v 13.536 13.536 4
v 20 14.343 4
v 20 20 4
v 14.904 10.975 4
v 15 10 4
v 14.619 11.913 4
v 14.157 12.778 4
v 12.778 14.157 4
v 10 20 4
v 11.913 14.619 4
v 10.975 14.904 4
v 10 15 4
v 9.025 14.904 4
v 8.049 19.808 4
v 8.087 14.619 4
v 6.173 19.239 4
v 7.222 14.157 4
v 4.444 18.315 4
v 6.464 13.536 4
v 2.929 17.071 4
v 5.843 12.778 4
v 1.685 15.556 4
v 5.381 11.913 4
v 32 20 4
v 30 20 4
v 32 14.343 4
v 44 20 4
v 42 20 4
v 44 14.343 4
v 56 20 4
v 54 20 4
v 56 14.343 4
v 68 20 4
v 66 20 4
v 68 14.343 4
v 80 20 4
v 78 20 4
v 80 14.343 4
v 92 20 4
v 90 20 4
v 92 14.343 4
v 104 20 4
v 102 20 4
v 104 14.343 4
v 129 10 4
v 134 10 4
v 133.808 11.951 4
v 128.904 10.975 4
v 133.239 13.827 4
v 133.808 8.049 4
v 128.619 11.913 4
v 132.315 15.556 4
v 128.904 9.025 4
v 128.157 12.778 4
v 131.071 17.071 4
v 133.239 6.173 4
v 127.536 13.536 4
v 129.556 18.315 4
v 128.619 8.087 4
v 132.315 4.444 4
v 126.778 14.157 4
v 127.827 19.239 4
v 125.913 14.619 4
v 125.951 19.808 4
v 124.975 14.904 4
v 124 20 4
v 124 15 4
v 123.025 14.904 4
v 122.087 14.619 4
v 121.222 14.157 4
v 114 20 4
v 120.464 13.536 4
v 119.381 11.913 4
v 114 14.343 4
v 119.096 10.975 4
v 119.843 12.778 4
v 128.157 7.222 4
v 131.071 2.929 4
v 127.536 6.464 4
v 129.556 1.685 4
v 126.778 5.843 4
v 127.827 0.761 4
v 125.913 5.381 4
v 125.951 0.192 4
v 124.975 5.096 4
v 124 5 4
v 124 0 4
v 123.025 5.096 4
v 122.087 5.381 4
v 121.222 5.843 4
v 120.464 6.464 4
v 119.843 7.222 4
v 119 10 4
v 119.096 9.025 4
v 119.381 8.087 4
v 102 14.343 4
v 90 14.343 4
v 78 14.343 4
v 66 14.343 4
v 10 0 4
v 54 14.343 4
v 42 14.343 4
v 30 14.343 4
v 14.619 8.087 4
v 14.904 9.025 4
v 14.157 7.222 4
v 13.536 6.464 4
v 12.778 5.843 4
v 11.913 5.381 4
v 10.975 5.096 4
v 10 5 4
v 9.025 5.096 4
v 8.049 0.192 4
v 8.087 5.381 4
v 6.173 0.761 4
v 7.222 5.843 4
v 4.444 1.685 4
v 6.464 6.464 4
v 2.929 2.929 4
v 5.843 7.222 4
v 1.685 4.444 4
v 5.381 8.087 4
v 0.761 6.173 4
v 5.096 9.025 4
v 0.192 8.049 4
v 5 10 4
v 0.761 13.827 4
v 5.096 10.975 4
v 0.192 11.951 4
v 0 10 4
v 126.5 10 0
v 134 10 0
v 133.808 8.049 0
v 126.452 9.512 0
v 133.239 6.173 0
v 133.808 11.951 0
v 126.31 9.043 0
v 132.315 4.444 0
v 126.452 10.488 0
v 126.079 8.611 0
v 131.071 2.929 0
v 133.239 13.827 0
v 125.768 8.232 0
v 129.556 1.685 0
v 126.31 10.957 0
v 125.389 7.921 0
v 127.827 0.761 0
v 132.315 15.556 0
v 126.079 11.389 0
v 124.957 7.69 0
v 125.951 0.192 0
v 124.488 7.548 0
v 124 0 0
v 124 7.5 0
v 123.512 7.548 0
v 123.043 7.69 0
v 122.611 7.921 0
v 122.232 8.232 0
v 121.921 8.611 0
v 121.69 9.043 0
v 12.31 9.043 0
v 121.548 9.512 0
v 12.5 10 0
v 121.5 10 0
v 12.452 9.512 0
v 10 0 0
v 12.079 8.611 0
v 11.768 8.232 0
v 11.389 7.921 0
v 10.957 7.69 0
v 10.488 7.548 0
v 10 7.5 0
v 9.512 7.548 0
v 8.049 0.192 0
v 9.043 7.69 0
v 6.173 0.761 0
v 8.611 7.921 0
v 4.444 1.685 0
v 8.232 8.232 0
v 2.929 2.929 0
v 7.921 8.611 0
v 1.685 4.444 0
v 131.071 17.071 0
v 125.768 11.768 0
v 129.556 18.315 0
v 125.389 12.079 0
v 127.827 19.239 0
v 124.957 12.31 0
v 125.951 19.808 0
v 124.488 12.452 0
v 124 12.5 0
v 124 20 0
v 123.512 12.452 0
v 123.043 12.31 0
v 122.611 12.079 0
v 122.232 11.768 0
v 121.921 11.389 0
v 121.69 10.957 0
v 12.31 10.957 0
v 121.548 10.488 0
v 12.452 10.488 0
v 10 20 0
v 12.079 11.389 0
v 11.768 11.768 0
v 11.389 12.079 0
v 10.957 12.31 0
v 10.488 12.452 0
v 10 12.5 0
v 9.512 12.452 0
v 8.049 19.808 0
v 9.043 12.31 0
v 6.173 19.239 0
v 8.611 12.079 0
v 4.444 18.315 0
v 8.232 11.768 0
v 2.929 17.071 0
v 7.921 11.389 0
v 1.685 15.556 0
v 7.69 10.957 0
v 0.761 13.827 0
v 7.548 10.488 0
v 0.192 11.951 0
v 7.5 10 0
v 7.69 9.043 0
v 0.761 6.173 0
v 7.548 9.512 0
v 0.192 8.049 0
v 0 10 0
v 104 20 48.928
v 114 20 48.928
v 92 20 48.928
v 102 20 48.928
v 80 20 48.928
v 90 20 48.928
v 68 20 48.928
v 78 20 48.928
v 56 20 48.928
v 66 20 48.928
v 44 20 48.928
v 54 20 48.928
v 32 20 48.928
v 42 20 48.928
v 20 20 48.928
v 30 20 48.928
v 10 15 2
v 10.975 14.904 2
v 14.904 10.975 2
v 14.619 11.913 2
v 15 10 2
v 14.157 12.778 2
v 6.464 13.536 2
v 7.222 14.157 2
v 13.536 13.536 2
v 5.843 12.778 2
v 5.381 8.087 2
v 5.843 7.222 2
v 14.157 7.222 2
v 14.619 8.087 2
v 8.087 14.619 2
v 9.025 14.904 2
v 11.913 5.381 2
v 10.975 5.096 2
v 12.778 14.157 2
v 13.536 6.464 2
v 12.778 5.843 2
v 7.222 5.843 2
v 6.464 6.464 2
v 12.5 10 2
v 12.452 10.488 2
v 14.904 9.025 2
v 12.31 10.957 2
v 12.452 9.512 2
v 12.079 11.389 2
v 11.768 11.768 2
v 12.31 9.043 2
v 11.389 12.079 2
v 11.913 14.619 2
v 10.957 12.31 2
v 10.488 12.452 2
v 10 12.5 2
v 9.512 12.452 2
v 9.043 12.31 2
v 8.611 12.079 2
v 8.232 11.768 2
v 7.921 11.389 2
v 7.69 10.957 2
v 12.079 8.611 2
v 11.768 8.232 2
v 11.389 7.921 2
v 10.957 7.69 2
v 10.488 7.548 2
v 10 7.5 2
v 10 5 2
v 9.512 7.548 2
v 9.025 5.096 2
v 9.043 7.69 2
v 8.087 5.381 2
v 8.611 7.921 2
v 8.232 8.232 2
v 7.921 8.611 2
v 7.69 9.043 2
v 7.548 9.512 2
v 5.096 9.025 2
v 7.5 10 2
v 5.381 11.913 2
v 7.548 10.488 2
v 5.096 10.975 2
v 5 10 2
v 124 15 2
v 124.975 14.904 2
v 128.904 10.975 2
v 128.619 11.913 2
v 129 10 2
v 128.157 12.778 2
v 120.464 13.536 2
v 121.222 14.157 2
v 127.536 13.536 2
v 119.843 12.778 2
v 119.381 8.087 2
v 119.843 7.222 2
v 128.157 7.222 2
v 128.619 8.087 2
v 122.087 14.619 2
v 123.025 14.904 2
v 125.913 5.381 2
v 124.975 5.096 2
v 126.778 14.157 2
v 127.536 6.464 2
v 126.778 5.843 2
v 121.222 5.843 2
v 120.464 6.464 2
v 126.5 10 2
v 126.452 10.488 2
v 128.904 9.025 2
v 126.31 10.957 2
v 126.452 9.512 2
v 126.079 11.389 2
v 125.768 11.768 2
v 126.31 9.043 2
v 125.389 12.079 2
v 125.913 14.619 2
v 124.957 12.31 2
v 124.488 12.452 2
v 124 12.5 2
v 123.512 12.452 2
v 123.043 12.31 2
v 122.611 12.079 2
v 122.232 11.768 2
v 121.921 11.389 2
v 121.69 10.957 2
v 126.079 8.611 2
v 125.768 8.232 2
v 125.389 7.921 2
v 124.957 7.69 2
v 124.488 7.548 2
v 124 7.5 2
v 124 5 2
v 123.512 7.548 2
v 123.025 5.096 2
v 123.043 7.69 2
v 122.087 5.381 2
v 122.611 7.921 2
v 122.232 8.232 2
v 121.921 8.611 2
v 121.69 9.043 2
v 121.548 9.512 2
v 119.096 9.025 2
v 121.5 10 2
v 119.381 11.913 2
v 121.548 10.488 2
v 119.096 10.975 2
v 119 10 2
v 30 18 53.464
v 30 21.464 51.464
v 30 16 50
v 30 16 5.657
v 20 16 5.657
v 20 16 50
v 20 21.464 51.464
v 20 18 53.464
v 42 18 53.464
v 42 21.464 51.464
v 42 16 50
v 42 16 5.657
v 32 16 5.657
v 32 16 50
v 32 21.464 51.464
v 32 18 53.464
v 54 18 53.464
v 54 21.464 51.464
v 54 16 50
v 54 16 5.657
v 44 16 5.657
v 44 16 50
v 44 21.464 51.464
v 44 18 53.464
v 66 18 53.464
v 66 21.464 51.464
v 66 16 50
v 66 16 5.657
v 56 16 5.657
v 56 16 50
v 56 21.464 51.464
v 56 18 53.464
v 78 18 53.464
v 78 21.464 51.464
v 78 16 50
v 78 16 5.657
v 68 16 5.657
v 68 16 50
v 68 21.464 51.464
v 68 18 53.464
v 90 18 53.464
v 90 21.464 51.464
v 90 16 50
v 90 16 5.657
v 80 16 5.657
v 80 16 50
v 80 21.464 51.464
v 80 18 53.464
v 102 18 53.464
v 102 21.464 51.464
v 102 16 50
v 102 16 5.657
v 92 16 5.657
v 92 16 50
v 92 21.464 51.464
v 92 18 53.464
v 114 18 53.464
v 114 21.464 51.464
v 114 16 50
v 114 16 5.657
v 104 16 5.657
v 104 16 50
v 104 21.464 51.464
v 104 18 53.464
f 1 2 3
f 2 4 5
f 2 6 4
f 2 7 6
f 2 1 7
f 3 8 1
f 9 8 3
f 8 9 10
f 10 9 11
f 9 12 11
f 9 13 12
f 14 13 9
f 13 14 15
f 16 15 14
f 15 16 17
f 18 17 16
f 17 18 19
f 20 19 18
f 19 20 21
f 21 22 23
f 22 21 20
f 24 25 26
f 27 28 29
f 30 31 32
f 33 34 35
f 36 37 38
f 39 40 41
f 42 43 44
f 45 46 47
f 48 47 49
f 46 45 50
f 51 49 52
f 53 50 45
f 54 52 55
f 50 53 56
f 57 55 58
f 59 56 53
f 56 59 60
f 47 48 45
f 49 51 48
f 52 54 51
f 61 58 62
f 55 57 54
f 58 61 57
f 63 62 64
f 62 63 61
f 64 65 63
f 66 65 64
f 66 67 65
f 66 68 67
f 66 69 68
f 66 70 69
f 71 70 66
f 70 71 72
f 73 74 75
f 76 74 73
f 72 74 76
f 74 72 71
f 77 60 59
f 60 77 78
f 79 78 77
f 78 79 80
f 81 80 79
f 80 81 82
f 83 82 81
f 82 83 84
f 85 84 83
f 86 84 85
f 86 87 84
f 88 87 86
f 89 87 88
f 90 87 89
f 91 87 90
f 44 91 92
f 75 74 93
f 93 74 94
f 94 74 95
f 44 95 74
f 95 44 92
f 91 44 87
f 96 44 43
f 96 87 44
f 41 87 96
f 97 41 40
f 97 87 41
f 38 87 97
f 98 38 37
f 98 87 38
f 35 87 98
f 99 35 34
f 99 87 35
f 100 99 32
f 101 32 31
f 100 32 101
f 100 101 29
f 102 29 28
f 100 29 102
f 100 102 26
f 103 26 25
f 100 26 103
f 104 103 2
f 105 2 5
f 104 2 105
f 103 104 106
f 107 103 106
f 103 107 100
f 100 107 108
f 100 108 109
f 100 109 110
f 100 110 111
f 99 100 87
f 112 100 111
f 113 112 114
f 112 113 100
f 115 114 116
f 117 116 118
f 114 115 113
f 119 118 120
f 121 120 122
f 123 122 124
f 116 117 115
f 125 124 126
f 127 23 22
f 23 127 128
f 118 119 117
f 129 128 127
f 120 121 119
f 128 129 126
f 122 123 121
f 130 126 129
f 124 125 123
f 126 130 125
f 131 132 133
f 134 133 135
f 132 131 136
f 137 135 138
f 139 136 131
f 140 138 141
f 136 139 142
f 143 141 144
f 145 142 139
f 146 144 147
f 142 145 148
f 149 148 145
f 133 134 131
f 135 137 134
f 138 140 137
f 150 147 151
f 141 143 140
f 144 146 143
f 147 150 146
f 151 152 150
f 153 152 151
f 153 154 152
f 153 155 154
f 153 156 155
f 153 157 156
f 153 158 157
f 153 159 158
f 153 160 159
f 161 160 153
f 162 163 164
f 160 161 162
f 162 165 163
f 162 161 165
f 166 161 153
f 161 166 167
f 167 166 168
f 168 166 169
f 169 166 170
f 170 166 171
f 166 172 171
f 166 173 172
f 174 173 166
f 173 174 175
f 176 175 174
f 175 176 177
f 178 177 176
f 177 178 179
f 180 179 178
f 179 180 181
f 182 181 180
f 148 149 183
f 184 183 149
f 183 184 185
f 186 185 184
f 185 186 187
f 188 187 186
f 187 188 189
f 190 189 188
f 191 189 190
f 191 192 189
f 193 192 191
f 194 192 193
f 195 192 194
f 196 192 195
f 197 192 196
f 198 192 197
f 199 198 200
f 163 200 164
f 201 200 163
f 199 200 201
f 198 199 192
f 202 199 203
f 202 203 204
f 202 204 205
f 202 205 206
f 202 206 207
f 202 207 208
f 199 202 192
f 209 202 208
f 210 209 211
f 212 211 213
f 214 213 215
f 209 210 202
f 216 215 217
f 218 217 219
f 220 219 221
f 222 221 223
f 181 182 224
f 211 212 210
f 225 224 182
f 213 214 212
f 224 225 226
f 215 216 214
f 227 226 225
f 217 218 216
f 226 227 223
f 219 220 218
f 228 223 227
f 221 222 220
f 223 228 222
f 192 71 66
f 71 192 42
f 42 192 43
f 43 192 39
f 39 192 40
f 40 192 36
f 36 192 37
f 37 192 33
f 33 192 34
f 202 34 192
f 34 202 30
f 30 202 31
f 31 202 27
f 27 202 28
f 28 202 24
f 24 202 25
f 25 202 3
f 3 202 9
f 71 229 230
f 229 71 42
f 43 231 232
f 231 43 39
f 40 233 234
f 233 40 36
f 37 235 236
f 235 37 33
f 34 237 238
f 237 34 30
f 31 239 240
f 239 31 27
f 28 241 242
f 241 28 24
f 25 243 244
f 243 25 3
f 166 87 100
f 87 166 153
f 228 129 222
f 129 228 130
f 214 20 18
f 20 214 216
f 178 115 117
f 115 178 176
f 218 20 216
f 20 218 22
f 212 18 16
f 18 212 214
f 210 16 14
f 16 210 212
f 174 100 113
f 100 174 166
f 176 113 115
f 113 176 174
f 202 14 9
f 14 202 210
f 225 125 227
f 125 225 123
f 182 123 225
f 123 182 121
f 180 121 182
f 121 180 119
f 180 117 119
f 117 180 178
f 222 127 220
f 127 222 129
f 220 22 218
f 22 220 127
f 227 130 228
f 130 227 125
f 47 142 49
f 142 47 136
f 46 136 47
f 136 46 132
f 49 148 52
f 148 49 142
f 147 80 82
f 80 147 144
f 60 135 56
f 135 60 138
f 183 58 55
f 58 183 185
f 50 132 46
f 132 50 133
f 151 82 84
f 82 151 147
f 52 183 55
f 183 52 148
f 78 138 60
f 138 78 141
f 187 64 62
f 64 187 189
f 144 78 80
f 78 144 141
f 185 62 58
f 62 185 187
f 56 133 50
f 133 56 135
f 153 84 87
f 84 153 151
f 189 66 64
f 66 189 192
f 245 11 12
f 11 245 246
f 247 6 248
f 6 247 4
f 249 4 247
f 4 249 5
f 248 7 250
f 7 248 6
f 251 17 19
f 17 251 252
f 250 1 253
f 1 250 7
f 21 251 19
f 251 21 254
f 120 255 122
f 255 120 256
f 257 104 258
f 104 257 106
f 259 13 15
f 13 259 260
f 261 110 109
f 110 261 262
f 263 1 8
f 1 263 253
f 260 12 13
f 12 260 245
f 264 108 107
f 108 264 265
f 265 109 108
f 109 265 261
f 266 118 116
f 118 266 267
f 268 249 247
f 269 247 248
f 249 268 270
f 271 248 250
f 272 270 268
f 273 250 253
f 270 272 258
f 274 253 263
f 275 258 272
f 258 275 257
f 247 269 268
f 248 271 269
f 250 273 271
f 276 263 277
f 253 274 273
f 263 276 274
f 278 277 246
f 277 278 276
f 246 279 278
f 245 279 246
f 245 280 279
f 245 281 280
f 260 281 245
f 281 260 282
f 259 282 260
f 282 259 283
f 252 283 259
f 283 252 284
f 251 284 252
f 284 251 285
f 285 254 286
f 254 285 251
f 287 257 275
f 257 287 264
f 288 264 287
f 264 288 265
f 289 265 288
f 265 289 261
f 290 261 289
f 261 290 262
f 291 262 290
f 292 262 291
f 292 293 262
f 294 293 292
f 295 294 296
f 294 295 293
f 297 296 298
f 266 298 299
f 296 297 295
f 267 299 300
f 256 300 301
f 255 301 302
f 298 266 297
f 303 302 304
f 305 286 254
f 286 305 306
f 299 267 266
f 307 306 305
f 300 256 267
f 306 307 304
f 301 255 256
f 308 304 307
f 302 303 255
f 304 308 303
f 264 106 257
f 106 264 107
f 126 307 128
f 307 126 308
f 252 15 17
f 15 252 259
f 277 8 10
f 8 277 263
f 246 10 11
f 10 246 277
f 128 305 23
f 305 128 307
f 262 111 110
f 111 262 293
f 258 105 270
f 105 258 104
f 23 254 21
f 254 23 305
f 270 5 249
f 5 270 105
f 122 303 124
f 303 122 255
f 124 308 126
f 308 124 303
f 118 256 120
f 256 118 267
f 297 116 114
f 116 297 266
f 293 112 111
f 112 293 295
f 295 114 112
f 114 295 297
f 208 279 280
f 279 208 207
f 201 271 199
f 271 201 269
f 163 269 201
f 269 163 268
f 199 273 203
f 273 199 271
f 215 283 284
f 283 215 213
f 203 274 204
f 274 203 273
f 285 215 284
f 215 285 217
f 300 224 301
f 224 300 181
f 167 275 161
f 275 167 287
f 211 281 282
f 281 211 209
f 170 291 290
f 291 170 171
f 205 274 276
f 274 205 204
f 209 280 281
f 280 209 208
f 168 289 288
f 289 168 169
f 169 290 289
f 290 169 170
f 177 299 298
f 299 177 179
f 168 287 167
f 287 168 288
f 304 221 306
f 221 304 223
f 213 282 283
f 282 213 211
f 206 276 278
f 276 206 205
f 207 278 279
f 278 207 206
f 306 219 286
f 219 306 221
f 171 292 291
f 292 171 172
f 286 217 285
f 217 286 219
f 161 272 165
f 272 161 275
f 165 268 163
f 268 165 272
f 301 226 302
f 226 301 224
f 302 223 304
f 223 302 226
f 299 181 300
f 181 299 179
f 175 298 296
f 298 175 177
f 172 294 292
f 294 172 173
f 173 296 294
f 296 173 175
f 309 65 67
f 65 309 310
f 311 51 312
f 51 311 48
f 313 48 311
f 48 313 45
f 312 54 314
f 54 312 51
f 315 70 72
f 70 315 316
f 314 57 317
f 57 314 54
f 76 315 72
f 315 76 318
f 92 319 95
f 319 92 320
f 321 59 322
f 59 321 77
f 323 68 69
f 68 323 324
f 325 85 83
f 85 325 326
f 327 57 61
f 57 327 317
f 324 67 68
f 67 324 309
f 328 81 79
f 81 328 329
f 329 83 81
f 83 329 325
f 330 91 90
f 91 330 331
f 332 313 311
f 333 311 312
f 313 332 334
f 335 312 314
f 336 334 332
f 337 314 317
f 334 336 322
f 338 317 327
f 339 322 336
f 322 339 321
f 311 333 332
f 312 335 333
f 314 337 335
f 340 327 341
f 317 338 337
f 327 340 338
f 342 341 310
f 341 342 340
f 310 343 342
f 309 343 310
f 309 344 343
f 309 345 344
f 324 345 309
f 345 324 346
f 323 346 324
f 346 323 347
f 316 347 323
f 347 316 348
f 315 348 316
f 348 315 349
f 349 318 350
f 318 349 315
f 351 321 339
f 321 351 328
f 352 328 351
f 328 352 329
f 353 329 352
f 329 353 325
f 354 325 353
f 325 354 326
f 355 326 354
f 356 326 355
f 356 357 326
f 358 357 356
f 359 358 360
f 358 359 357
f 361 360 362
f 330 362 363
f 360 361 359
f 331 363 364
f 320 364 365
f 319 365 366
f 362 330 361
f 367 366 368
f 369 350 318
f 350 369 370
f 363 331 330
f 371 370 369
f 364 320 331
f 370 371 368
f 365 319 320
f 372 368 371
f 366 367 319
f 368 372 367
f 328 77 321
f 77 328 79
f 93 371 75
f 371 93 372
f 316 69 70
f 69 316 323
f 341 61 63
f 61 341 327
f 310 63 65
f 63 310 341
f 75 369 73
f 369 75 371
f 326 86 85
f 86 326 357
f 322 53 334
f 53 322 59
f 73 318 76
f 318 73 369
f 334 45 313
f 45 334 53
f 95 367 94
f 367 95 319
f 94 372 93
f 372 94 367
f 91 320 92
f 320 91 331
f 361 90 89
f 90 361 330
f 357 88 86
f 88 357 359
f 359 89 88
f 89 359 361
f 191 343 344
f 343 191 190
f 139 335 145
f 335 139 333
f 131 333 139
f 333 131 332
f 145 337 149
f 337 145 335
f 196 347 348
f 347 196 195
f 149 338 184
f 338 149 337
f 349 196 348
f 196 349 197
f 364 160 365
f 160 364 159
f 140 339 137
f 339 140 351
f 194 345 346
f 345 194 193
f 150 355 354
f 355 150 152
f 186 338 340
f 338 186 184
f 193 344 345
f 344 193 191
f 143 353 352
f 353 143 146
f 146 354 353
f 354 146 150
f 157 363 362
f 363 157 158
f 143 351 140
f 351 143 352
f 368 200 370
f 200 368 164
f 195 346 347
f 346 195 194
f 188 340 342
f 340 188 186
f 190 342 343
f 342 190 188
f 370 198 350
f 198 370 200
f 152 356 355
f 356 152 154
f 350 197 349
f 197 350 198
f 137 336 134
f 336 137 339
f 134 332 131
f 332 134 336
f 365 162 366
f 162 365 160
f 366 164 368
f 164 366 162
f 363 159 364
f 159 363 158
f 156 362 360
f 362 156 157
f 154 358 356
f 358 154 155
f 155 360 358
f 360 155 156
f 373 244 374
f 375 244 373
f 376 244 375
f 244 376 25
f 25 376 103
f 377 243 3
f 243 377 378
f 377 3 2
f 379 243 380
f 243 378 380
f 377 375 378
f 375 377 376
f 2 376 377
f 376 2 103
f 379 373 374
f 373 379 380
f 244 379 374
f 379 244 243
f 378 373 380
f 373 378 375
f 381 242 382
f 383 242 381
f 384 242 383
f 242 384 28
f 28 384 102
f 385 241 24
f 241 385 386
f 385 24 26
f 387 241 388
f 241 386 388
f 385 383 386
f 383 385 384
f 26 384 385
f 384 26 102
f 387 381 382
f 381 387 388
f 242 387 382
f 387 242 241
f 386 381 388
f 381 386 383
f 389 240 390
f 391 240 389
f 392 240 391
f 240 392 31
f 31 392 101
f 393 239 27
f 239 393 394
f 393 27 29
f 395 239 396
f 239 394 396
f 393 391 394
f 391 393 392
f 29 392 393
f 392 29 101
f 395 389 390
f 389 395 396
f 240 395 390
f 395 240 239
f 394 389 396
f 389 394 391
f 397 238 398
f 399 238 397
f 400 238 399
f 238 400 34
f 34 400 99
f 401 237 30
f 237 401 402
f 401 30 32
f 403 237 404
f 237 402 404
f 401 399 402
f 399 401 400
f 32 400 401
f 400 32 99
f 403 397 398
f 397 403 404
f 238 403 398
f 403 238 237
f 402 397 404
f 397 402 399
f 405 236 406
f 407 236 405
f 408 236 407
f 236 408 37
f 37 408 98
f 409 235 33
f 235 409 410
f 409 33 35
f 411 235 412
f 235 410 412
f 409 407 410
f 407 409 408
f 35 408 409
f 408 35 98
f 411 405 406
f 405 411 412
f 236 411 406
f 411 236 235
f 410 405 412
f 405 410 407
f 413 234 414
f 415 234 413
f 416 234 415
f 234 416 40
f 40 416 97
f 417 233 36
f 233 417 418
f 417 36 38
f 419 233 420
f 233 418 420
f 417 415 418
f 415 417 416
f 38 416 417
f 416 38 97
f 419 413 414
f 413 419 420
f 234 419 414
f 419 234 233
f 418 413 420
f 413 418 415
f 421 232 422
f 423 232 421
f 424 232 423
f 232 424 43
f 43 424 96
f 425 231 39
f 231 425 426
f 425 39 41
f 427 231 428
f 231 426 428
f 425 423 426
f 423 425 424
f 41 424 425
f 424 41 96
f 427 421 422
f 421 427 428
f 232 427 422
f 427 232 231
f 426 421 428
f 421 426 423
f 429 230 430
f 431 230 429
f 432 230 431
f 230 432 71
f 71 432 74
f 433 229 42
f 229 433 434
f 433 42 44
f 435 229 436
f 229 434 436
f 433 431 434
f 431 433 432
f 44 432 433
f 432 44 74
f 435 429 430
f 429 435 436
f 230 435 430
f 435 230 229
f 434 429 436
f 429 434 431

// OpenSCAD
// [FL_INDEX: keywords="openscad, 3d_parametric, Jumper_Wire_Rack, csg_solid" | COT="Parametric OpenSCAD design from 3DCodeverse"]
// Title: Jumper Wire Rack

// This script creates a wire rack with a variable number of tines

$fn = 32+1-1;	// Dummy math to avoid showing in customizer.

// Number of tines
N = 8;			// [2:20]
tine_width = 10;
tine_height = 4+1-1;
tine_length = 50;
tine_pitch = 12;

base_height = 20;
base_width = base_height*2 + (N-1)*(tine_pitch) + tine_width;
base_thickness = 4+1-1;

echo("<b>Base width [mm]:", base_width);

countersink_diameter = 10;
hole_diameter = 5;

difference()
{
	// Baseplate
	union()
	{
		translate([base_height/2,0,0]) cube([base_width-base_height,base_height,base_thickness]);
		translate([base_height/2,base_height/2,0]) cylinder(base_thickness,base_height/2,base_height/2);
		translate([base_width-base_height/2,base_height/2,0]) cylinder(base_thickness,base_height/2,base_height/2);		
	}

	// Screw holes
	for (i = [0:1])
	{
		translate([base_height/2+(base_width-base_height)*i,base_height/2,4])
		{
			union()
			{
				// Countersink
				cylinder(base_thickness,countersink_diameter/2,countersink_diameter/2,true);

				// Screw hole
				cylinder(base_thickness*3,hole_diameter/2,hole_diameter/2,true);
			}

		}
	}

	// Text
	/*translate([base_width/2-10.75*2.4,2,base_thickness-1])
		scale([12,12,2])
			import("WireRackText.stl");*/
}

// Tines
for (i = [0:(N-1)])
{
	// Tine
	translate([base_height + tine_pitch*i, base_height - tine_height, 0])
		cube([tine_width,tine_height,tine_length]);

	// Tine support
	translate([base_height + tine_pitch*i, base_height-tine_height, 0])
		rotate([45, 0, 0])
			cube([tine_width, tine_height, tine_height]);

	// Upturned tine end
	translate([base_height+tine_pitch*i,base_height-tine_height,tine_length])
		rotate([-30,0,0])
			cube([tine_width,tine_height,tine_height]);
}
